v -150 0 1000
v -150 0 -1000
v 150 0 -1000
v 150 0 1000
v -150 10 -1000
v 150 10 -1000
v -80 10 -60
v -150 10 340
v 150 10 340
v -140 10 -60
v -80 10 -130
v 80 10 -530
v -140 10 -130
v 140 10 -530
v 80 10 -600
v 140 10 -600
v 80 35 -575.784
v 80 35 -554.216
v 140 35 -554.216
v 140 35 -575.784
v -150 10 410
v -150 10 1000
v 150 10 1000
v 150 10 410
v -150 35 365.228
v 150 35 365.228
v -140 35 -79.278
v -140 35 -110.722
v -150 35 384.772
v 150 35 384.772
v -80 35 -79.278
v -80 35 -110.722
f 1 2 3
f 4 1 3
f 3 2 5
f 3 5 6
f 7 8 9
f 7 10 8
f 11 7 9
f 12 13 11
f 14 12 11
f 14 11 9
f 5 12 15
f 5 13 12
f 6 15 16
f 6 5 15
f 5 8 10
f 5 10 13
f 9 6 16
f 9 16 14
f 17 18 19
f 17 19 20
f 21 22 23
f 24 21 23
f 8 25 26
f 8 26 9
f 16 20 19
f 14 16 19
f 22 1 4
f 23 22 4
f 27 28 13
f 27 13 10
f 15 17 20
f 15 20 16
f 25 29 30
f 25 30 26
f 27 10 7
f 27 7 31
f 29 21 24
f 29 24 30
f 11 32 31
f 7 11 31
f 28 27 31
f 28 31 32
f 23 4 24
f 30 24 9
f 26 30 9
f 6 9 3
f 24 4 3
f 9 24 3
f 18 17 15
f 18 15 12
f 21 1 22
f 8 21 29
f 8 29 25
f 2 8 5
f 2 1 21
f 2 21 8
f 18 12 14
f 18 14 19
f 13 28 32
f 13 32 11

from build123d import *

# Parameters (mm, degrees)
SKETCH1_W                = 300
SKETCH1_H                = 2000
BOSS_EXTRUDE1_DEPTH      = 10
BOSS_EXTRUDE2_START      = 80
BOSS_EXTRUDE2_DEPTH      = 60
BOSS_EXTRUDE3_START      = -140
BOSS_EXTRUDE3_DEPTH      = 60
BOSS_EXTRUDE4_DEPTH      = 150
BOSS_EXTRUDE4_DEPTH_BACK = 150


with BuildPart() as part:
    # Sketch1 → Boss-Extrude1 (new body)
    with BuildSketch(Plane(origin=(0, 0, 0), x_dir=(1, 0, 0), z_dir=(0, 1, 0))):
        Rectangle(SKETCH1_W, SKETCH1_H)
    extrude(amount=BOSS_EXTRUDE1_DEPTH)

    # Sketch2 → Boss-Extrude2 (add)
    with BuildSketch(Plane(origin=(0, 0, 0), x_dir=(0, 0, -1), z_dir=(1, 0, 0)).offset(BOSS_EXTRUDE2_START)):
        Polygon((530, 10), (554.216468309, 35), (575.783531691, 35), (600, 10), align=None)
    extrude(amount=BOSS_EXTRUDE2_DEPTH)

    # Sketch3 → Boss-Extrude3 (add)
    with BuildSketch(Plane(origin=(0, 0, 0), x_dir=(0, 0, -1), z_dir=(1, 0, 0)).offset(BOSS_EXTRUDE3_START)):
        Polygon((60, 10), (79.278295144, 35), (110.721704856, 35), (130, 10), align=None)
    extrude(amount=BOSS_EXTRUDE3_DEPTH)

    # Sketch4 → Boss-Extrude4 (add, two sides: drawn at the far end of the back side and taken through both)
    with BuildSketch(Plane(origin=(0, 0, 0), x_dir=(0, 0, -1), z_dir=(1, 0, 0)).offset(-BOSS_EXTRUDE4_DEPTH_BACK)):
        Polygon((-410, 10), (-384.771871556, 35), (-365.228128444, 35), (-340, 10), align=None)
    extrude(amount=BOSS_EXTRUDE4_DEPTH + BOSS_EXTRUDE4_DEPTH_BACK)


solid = part.part
